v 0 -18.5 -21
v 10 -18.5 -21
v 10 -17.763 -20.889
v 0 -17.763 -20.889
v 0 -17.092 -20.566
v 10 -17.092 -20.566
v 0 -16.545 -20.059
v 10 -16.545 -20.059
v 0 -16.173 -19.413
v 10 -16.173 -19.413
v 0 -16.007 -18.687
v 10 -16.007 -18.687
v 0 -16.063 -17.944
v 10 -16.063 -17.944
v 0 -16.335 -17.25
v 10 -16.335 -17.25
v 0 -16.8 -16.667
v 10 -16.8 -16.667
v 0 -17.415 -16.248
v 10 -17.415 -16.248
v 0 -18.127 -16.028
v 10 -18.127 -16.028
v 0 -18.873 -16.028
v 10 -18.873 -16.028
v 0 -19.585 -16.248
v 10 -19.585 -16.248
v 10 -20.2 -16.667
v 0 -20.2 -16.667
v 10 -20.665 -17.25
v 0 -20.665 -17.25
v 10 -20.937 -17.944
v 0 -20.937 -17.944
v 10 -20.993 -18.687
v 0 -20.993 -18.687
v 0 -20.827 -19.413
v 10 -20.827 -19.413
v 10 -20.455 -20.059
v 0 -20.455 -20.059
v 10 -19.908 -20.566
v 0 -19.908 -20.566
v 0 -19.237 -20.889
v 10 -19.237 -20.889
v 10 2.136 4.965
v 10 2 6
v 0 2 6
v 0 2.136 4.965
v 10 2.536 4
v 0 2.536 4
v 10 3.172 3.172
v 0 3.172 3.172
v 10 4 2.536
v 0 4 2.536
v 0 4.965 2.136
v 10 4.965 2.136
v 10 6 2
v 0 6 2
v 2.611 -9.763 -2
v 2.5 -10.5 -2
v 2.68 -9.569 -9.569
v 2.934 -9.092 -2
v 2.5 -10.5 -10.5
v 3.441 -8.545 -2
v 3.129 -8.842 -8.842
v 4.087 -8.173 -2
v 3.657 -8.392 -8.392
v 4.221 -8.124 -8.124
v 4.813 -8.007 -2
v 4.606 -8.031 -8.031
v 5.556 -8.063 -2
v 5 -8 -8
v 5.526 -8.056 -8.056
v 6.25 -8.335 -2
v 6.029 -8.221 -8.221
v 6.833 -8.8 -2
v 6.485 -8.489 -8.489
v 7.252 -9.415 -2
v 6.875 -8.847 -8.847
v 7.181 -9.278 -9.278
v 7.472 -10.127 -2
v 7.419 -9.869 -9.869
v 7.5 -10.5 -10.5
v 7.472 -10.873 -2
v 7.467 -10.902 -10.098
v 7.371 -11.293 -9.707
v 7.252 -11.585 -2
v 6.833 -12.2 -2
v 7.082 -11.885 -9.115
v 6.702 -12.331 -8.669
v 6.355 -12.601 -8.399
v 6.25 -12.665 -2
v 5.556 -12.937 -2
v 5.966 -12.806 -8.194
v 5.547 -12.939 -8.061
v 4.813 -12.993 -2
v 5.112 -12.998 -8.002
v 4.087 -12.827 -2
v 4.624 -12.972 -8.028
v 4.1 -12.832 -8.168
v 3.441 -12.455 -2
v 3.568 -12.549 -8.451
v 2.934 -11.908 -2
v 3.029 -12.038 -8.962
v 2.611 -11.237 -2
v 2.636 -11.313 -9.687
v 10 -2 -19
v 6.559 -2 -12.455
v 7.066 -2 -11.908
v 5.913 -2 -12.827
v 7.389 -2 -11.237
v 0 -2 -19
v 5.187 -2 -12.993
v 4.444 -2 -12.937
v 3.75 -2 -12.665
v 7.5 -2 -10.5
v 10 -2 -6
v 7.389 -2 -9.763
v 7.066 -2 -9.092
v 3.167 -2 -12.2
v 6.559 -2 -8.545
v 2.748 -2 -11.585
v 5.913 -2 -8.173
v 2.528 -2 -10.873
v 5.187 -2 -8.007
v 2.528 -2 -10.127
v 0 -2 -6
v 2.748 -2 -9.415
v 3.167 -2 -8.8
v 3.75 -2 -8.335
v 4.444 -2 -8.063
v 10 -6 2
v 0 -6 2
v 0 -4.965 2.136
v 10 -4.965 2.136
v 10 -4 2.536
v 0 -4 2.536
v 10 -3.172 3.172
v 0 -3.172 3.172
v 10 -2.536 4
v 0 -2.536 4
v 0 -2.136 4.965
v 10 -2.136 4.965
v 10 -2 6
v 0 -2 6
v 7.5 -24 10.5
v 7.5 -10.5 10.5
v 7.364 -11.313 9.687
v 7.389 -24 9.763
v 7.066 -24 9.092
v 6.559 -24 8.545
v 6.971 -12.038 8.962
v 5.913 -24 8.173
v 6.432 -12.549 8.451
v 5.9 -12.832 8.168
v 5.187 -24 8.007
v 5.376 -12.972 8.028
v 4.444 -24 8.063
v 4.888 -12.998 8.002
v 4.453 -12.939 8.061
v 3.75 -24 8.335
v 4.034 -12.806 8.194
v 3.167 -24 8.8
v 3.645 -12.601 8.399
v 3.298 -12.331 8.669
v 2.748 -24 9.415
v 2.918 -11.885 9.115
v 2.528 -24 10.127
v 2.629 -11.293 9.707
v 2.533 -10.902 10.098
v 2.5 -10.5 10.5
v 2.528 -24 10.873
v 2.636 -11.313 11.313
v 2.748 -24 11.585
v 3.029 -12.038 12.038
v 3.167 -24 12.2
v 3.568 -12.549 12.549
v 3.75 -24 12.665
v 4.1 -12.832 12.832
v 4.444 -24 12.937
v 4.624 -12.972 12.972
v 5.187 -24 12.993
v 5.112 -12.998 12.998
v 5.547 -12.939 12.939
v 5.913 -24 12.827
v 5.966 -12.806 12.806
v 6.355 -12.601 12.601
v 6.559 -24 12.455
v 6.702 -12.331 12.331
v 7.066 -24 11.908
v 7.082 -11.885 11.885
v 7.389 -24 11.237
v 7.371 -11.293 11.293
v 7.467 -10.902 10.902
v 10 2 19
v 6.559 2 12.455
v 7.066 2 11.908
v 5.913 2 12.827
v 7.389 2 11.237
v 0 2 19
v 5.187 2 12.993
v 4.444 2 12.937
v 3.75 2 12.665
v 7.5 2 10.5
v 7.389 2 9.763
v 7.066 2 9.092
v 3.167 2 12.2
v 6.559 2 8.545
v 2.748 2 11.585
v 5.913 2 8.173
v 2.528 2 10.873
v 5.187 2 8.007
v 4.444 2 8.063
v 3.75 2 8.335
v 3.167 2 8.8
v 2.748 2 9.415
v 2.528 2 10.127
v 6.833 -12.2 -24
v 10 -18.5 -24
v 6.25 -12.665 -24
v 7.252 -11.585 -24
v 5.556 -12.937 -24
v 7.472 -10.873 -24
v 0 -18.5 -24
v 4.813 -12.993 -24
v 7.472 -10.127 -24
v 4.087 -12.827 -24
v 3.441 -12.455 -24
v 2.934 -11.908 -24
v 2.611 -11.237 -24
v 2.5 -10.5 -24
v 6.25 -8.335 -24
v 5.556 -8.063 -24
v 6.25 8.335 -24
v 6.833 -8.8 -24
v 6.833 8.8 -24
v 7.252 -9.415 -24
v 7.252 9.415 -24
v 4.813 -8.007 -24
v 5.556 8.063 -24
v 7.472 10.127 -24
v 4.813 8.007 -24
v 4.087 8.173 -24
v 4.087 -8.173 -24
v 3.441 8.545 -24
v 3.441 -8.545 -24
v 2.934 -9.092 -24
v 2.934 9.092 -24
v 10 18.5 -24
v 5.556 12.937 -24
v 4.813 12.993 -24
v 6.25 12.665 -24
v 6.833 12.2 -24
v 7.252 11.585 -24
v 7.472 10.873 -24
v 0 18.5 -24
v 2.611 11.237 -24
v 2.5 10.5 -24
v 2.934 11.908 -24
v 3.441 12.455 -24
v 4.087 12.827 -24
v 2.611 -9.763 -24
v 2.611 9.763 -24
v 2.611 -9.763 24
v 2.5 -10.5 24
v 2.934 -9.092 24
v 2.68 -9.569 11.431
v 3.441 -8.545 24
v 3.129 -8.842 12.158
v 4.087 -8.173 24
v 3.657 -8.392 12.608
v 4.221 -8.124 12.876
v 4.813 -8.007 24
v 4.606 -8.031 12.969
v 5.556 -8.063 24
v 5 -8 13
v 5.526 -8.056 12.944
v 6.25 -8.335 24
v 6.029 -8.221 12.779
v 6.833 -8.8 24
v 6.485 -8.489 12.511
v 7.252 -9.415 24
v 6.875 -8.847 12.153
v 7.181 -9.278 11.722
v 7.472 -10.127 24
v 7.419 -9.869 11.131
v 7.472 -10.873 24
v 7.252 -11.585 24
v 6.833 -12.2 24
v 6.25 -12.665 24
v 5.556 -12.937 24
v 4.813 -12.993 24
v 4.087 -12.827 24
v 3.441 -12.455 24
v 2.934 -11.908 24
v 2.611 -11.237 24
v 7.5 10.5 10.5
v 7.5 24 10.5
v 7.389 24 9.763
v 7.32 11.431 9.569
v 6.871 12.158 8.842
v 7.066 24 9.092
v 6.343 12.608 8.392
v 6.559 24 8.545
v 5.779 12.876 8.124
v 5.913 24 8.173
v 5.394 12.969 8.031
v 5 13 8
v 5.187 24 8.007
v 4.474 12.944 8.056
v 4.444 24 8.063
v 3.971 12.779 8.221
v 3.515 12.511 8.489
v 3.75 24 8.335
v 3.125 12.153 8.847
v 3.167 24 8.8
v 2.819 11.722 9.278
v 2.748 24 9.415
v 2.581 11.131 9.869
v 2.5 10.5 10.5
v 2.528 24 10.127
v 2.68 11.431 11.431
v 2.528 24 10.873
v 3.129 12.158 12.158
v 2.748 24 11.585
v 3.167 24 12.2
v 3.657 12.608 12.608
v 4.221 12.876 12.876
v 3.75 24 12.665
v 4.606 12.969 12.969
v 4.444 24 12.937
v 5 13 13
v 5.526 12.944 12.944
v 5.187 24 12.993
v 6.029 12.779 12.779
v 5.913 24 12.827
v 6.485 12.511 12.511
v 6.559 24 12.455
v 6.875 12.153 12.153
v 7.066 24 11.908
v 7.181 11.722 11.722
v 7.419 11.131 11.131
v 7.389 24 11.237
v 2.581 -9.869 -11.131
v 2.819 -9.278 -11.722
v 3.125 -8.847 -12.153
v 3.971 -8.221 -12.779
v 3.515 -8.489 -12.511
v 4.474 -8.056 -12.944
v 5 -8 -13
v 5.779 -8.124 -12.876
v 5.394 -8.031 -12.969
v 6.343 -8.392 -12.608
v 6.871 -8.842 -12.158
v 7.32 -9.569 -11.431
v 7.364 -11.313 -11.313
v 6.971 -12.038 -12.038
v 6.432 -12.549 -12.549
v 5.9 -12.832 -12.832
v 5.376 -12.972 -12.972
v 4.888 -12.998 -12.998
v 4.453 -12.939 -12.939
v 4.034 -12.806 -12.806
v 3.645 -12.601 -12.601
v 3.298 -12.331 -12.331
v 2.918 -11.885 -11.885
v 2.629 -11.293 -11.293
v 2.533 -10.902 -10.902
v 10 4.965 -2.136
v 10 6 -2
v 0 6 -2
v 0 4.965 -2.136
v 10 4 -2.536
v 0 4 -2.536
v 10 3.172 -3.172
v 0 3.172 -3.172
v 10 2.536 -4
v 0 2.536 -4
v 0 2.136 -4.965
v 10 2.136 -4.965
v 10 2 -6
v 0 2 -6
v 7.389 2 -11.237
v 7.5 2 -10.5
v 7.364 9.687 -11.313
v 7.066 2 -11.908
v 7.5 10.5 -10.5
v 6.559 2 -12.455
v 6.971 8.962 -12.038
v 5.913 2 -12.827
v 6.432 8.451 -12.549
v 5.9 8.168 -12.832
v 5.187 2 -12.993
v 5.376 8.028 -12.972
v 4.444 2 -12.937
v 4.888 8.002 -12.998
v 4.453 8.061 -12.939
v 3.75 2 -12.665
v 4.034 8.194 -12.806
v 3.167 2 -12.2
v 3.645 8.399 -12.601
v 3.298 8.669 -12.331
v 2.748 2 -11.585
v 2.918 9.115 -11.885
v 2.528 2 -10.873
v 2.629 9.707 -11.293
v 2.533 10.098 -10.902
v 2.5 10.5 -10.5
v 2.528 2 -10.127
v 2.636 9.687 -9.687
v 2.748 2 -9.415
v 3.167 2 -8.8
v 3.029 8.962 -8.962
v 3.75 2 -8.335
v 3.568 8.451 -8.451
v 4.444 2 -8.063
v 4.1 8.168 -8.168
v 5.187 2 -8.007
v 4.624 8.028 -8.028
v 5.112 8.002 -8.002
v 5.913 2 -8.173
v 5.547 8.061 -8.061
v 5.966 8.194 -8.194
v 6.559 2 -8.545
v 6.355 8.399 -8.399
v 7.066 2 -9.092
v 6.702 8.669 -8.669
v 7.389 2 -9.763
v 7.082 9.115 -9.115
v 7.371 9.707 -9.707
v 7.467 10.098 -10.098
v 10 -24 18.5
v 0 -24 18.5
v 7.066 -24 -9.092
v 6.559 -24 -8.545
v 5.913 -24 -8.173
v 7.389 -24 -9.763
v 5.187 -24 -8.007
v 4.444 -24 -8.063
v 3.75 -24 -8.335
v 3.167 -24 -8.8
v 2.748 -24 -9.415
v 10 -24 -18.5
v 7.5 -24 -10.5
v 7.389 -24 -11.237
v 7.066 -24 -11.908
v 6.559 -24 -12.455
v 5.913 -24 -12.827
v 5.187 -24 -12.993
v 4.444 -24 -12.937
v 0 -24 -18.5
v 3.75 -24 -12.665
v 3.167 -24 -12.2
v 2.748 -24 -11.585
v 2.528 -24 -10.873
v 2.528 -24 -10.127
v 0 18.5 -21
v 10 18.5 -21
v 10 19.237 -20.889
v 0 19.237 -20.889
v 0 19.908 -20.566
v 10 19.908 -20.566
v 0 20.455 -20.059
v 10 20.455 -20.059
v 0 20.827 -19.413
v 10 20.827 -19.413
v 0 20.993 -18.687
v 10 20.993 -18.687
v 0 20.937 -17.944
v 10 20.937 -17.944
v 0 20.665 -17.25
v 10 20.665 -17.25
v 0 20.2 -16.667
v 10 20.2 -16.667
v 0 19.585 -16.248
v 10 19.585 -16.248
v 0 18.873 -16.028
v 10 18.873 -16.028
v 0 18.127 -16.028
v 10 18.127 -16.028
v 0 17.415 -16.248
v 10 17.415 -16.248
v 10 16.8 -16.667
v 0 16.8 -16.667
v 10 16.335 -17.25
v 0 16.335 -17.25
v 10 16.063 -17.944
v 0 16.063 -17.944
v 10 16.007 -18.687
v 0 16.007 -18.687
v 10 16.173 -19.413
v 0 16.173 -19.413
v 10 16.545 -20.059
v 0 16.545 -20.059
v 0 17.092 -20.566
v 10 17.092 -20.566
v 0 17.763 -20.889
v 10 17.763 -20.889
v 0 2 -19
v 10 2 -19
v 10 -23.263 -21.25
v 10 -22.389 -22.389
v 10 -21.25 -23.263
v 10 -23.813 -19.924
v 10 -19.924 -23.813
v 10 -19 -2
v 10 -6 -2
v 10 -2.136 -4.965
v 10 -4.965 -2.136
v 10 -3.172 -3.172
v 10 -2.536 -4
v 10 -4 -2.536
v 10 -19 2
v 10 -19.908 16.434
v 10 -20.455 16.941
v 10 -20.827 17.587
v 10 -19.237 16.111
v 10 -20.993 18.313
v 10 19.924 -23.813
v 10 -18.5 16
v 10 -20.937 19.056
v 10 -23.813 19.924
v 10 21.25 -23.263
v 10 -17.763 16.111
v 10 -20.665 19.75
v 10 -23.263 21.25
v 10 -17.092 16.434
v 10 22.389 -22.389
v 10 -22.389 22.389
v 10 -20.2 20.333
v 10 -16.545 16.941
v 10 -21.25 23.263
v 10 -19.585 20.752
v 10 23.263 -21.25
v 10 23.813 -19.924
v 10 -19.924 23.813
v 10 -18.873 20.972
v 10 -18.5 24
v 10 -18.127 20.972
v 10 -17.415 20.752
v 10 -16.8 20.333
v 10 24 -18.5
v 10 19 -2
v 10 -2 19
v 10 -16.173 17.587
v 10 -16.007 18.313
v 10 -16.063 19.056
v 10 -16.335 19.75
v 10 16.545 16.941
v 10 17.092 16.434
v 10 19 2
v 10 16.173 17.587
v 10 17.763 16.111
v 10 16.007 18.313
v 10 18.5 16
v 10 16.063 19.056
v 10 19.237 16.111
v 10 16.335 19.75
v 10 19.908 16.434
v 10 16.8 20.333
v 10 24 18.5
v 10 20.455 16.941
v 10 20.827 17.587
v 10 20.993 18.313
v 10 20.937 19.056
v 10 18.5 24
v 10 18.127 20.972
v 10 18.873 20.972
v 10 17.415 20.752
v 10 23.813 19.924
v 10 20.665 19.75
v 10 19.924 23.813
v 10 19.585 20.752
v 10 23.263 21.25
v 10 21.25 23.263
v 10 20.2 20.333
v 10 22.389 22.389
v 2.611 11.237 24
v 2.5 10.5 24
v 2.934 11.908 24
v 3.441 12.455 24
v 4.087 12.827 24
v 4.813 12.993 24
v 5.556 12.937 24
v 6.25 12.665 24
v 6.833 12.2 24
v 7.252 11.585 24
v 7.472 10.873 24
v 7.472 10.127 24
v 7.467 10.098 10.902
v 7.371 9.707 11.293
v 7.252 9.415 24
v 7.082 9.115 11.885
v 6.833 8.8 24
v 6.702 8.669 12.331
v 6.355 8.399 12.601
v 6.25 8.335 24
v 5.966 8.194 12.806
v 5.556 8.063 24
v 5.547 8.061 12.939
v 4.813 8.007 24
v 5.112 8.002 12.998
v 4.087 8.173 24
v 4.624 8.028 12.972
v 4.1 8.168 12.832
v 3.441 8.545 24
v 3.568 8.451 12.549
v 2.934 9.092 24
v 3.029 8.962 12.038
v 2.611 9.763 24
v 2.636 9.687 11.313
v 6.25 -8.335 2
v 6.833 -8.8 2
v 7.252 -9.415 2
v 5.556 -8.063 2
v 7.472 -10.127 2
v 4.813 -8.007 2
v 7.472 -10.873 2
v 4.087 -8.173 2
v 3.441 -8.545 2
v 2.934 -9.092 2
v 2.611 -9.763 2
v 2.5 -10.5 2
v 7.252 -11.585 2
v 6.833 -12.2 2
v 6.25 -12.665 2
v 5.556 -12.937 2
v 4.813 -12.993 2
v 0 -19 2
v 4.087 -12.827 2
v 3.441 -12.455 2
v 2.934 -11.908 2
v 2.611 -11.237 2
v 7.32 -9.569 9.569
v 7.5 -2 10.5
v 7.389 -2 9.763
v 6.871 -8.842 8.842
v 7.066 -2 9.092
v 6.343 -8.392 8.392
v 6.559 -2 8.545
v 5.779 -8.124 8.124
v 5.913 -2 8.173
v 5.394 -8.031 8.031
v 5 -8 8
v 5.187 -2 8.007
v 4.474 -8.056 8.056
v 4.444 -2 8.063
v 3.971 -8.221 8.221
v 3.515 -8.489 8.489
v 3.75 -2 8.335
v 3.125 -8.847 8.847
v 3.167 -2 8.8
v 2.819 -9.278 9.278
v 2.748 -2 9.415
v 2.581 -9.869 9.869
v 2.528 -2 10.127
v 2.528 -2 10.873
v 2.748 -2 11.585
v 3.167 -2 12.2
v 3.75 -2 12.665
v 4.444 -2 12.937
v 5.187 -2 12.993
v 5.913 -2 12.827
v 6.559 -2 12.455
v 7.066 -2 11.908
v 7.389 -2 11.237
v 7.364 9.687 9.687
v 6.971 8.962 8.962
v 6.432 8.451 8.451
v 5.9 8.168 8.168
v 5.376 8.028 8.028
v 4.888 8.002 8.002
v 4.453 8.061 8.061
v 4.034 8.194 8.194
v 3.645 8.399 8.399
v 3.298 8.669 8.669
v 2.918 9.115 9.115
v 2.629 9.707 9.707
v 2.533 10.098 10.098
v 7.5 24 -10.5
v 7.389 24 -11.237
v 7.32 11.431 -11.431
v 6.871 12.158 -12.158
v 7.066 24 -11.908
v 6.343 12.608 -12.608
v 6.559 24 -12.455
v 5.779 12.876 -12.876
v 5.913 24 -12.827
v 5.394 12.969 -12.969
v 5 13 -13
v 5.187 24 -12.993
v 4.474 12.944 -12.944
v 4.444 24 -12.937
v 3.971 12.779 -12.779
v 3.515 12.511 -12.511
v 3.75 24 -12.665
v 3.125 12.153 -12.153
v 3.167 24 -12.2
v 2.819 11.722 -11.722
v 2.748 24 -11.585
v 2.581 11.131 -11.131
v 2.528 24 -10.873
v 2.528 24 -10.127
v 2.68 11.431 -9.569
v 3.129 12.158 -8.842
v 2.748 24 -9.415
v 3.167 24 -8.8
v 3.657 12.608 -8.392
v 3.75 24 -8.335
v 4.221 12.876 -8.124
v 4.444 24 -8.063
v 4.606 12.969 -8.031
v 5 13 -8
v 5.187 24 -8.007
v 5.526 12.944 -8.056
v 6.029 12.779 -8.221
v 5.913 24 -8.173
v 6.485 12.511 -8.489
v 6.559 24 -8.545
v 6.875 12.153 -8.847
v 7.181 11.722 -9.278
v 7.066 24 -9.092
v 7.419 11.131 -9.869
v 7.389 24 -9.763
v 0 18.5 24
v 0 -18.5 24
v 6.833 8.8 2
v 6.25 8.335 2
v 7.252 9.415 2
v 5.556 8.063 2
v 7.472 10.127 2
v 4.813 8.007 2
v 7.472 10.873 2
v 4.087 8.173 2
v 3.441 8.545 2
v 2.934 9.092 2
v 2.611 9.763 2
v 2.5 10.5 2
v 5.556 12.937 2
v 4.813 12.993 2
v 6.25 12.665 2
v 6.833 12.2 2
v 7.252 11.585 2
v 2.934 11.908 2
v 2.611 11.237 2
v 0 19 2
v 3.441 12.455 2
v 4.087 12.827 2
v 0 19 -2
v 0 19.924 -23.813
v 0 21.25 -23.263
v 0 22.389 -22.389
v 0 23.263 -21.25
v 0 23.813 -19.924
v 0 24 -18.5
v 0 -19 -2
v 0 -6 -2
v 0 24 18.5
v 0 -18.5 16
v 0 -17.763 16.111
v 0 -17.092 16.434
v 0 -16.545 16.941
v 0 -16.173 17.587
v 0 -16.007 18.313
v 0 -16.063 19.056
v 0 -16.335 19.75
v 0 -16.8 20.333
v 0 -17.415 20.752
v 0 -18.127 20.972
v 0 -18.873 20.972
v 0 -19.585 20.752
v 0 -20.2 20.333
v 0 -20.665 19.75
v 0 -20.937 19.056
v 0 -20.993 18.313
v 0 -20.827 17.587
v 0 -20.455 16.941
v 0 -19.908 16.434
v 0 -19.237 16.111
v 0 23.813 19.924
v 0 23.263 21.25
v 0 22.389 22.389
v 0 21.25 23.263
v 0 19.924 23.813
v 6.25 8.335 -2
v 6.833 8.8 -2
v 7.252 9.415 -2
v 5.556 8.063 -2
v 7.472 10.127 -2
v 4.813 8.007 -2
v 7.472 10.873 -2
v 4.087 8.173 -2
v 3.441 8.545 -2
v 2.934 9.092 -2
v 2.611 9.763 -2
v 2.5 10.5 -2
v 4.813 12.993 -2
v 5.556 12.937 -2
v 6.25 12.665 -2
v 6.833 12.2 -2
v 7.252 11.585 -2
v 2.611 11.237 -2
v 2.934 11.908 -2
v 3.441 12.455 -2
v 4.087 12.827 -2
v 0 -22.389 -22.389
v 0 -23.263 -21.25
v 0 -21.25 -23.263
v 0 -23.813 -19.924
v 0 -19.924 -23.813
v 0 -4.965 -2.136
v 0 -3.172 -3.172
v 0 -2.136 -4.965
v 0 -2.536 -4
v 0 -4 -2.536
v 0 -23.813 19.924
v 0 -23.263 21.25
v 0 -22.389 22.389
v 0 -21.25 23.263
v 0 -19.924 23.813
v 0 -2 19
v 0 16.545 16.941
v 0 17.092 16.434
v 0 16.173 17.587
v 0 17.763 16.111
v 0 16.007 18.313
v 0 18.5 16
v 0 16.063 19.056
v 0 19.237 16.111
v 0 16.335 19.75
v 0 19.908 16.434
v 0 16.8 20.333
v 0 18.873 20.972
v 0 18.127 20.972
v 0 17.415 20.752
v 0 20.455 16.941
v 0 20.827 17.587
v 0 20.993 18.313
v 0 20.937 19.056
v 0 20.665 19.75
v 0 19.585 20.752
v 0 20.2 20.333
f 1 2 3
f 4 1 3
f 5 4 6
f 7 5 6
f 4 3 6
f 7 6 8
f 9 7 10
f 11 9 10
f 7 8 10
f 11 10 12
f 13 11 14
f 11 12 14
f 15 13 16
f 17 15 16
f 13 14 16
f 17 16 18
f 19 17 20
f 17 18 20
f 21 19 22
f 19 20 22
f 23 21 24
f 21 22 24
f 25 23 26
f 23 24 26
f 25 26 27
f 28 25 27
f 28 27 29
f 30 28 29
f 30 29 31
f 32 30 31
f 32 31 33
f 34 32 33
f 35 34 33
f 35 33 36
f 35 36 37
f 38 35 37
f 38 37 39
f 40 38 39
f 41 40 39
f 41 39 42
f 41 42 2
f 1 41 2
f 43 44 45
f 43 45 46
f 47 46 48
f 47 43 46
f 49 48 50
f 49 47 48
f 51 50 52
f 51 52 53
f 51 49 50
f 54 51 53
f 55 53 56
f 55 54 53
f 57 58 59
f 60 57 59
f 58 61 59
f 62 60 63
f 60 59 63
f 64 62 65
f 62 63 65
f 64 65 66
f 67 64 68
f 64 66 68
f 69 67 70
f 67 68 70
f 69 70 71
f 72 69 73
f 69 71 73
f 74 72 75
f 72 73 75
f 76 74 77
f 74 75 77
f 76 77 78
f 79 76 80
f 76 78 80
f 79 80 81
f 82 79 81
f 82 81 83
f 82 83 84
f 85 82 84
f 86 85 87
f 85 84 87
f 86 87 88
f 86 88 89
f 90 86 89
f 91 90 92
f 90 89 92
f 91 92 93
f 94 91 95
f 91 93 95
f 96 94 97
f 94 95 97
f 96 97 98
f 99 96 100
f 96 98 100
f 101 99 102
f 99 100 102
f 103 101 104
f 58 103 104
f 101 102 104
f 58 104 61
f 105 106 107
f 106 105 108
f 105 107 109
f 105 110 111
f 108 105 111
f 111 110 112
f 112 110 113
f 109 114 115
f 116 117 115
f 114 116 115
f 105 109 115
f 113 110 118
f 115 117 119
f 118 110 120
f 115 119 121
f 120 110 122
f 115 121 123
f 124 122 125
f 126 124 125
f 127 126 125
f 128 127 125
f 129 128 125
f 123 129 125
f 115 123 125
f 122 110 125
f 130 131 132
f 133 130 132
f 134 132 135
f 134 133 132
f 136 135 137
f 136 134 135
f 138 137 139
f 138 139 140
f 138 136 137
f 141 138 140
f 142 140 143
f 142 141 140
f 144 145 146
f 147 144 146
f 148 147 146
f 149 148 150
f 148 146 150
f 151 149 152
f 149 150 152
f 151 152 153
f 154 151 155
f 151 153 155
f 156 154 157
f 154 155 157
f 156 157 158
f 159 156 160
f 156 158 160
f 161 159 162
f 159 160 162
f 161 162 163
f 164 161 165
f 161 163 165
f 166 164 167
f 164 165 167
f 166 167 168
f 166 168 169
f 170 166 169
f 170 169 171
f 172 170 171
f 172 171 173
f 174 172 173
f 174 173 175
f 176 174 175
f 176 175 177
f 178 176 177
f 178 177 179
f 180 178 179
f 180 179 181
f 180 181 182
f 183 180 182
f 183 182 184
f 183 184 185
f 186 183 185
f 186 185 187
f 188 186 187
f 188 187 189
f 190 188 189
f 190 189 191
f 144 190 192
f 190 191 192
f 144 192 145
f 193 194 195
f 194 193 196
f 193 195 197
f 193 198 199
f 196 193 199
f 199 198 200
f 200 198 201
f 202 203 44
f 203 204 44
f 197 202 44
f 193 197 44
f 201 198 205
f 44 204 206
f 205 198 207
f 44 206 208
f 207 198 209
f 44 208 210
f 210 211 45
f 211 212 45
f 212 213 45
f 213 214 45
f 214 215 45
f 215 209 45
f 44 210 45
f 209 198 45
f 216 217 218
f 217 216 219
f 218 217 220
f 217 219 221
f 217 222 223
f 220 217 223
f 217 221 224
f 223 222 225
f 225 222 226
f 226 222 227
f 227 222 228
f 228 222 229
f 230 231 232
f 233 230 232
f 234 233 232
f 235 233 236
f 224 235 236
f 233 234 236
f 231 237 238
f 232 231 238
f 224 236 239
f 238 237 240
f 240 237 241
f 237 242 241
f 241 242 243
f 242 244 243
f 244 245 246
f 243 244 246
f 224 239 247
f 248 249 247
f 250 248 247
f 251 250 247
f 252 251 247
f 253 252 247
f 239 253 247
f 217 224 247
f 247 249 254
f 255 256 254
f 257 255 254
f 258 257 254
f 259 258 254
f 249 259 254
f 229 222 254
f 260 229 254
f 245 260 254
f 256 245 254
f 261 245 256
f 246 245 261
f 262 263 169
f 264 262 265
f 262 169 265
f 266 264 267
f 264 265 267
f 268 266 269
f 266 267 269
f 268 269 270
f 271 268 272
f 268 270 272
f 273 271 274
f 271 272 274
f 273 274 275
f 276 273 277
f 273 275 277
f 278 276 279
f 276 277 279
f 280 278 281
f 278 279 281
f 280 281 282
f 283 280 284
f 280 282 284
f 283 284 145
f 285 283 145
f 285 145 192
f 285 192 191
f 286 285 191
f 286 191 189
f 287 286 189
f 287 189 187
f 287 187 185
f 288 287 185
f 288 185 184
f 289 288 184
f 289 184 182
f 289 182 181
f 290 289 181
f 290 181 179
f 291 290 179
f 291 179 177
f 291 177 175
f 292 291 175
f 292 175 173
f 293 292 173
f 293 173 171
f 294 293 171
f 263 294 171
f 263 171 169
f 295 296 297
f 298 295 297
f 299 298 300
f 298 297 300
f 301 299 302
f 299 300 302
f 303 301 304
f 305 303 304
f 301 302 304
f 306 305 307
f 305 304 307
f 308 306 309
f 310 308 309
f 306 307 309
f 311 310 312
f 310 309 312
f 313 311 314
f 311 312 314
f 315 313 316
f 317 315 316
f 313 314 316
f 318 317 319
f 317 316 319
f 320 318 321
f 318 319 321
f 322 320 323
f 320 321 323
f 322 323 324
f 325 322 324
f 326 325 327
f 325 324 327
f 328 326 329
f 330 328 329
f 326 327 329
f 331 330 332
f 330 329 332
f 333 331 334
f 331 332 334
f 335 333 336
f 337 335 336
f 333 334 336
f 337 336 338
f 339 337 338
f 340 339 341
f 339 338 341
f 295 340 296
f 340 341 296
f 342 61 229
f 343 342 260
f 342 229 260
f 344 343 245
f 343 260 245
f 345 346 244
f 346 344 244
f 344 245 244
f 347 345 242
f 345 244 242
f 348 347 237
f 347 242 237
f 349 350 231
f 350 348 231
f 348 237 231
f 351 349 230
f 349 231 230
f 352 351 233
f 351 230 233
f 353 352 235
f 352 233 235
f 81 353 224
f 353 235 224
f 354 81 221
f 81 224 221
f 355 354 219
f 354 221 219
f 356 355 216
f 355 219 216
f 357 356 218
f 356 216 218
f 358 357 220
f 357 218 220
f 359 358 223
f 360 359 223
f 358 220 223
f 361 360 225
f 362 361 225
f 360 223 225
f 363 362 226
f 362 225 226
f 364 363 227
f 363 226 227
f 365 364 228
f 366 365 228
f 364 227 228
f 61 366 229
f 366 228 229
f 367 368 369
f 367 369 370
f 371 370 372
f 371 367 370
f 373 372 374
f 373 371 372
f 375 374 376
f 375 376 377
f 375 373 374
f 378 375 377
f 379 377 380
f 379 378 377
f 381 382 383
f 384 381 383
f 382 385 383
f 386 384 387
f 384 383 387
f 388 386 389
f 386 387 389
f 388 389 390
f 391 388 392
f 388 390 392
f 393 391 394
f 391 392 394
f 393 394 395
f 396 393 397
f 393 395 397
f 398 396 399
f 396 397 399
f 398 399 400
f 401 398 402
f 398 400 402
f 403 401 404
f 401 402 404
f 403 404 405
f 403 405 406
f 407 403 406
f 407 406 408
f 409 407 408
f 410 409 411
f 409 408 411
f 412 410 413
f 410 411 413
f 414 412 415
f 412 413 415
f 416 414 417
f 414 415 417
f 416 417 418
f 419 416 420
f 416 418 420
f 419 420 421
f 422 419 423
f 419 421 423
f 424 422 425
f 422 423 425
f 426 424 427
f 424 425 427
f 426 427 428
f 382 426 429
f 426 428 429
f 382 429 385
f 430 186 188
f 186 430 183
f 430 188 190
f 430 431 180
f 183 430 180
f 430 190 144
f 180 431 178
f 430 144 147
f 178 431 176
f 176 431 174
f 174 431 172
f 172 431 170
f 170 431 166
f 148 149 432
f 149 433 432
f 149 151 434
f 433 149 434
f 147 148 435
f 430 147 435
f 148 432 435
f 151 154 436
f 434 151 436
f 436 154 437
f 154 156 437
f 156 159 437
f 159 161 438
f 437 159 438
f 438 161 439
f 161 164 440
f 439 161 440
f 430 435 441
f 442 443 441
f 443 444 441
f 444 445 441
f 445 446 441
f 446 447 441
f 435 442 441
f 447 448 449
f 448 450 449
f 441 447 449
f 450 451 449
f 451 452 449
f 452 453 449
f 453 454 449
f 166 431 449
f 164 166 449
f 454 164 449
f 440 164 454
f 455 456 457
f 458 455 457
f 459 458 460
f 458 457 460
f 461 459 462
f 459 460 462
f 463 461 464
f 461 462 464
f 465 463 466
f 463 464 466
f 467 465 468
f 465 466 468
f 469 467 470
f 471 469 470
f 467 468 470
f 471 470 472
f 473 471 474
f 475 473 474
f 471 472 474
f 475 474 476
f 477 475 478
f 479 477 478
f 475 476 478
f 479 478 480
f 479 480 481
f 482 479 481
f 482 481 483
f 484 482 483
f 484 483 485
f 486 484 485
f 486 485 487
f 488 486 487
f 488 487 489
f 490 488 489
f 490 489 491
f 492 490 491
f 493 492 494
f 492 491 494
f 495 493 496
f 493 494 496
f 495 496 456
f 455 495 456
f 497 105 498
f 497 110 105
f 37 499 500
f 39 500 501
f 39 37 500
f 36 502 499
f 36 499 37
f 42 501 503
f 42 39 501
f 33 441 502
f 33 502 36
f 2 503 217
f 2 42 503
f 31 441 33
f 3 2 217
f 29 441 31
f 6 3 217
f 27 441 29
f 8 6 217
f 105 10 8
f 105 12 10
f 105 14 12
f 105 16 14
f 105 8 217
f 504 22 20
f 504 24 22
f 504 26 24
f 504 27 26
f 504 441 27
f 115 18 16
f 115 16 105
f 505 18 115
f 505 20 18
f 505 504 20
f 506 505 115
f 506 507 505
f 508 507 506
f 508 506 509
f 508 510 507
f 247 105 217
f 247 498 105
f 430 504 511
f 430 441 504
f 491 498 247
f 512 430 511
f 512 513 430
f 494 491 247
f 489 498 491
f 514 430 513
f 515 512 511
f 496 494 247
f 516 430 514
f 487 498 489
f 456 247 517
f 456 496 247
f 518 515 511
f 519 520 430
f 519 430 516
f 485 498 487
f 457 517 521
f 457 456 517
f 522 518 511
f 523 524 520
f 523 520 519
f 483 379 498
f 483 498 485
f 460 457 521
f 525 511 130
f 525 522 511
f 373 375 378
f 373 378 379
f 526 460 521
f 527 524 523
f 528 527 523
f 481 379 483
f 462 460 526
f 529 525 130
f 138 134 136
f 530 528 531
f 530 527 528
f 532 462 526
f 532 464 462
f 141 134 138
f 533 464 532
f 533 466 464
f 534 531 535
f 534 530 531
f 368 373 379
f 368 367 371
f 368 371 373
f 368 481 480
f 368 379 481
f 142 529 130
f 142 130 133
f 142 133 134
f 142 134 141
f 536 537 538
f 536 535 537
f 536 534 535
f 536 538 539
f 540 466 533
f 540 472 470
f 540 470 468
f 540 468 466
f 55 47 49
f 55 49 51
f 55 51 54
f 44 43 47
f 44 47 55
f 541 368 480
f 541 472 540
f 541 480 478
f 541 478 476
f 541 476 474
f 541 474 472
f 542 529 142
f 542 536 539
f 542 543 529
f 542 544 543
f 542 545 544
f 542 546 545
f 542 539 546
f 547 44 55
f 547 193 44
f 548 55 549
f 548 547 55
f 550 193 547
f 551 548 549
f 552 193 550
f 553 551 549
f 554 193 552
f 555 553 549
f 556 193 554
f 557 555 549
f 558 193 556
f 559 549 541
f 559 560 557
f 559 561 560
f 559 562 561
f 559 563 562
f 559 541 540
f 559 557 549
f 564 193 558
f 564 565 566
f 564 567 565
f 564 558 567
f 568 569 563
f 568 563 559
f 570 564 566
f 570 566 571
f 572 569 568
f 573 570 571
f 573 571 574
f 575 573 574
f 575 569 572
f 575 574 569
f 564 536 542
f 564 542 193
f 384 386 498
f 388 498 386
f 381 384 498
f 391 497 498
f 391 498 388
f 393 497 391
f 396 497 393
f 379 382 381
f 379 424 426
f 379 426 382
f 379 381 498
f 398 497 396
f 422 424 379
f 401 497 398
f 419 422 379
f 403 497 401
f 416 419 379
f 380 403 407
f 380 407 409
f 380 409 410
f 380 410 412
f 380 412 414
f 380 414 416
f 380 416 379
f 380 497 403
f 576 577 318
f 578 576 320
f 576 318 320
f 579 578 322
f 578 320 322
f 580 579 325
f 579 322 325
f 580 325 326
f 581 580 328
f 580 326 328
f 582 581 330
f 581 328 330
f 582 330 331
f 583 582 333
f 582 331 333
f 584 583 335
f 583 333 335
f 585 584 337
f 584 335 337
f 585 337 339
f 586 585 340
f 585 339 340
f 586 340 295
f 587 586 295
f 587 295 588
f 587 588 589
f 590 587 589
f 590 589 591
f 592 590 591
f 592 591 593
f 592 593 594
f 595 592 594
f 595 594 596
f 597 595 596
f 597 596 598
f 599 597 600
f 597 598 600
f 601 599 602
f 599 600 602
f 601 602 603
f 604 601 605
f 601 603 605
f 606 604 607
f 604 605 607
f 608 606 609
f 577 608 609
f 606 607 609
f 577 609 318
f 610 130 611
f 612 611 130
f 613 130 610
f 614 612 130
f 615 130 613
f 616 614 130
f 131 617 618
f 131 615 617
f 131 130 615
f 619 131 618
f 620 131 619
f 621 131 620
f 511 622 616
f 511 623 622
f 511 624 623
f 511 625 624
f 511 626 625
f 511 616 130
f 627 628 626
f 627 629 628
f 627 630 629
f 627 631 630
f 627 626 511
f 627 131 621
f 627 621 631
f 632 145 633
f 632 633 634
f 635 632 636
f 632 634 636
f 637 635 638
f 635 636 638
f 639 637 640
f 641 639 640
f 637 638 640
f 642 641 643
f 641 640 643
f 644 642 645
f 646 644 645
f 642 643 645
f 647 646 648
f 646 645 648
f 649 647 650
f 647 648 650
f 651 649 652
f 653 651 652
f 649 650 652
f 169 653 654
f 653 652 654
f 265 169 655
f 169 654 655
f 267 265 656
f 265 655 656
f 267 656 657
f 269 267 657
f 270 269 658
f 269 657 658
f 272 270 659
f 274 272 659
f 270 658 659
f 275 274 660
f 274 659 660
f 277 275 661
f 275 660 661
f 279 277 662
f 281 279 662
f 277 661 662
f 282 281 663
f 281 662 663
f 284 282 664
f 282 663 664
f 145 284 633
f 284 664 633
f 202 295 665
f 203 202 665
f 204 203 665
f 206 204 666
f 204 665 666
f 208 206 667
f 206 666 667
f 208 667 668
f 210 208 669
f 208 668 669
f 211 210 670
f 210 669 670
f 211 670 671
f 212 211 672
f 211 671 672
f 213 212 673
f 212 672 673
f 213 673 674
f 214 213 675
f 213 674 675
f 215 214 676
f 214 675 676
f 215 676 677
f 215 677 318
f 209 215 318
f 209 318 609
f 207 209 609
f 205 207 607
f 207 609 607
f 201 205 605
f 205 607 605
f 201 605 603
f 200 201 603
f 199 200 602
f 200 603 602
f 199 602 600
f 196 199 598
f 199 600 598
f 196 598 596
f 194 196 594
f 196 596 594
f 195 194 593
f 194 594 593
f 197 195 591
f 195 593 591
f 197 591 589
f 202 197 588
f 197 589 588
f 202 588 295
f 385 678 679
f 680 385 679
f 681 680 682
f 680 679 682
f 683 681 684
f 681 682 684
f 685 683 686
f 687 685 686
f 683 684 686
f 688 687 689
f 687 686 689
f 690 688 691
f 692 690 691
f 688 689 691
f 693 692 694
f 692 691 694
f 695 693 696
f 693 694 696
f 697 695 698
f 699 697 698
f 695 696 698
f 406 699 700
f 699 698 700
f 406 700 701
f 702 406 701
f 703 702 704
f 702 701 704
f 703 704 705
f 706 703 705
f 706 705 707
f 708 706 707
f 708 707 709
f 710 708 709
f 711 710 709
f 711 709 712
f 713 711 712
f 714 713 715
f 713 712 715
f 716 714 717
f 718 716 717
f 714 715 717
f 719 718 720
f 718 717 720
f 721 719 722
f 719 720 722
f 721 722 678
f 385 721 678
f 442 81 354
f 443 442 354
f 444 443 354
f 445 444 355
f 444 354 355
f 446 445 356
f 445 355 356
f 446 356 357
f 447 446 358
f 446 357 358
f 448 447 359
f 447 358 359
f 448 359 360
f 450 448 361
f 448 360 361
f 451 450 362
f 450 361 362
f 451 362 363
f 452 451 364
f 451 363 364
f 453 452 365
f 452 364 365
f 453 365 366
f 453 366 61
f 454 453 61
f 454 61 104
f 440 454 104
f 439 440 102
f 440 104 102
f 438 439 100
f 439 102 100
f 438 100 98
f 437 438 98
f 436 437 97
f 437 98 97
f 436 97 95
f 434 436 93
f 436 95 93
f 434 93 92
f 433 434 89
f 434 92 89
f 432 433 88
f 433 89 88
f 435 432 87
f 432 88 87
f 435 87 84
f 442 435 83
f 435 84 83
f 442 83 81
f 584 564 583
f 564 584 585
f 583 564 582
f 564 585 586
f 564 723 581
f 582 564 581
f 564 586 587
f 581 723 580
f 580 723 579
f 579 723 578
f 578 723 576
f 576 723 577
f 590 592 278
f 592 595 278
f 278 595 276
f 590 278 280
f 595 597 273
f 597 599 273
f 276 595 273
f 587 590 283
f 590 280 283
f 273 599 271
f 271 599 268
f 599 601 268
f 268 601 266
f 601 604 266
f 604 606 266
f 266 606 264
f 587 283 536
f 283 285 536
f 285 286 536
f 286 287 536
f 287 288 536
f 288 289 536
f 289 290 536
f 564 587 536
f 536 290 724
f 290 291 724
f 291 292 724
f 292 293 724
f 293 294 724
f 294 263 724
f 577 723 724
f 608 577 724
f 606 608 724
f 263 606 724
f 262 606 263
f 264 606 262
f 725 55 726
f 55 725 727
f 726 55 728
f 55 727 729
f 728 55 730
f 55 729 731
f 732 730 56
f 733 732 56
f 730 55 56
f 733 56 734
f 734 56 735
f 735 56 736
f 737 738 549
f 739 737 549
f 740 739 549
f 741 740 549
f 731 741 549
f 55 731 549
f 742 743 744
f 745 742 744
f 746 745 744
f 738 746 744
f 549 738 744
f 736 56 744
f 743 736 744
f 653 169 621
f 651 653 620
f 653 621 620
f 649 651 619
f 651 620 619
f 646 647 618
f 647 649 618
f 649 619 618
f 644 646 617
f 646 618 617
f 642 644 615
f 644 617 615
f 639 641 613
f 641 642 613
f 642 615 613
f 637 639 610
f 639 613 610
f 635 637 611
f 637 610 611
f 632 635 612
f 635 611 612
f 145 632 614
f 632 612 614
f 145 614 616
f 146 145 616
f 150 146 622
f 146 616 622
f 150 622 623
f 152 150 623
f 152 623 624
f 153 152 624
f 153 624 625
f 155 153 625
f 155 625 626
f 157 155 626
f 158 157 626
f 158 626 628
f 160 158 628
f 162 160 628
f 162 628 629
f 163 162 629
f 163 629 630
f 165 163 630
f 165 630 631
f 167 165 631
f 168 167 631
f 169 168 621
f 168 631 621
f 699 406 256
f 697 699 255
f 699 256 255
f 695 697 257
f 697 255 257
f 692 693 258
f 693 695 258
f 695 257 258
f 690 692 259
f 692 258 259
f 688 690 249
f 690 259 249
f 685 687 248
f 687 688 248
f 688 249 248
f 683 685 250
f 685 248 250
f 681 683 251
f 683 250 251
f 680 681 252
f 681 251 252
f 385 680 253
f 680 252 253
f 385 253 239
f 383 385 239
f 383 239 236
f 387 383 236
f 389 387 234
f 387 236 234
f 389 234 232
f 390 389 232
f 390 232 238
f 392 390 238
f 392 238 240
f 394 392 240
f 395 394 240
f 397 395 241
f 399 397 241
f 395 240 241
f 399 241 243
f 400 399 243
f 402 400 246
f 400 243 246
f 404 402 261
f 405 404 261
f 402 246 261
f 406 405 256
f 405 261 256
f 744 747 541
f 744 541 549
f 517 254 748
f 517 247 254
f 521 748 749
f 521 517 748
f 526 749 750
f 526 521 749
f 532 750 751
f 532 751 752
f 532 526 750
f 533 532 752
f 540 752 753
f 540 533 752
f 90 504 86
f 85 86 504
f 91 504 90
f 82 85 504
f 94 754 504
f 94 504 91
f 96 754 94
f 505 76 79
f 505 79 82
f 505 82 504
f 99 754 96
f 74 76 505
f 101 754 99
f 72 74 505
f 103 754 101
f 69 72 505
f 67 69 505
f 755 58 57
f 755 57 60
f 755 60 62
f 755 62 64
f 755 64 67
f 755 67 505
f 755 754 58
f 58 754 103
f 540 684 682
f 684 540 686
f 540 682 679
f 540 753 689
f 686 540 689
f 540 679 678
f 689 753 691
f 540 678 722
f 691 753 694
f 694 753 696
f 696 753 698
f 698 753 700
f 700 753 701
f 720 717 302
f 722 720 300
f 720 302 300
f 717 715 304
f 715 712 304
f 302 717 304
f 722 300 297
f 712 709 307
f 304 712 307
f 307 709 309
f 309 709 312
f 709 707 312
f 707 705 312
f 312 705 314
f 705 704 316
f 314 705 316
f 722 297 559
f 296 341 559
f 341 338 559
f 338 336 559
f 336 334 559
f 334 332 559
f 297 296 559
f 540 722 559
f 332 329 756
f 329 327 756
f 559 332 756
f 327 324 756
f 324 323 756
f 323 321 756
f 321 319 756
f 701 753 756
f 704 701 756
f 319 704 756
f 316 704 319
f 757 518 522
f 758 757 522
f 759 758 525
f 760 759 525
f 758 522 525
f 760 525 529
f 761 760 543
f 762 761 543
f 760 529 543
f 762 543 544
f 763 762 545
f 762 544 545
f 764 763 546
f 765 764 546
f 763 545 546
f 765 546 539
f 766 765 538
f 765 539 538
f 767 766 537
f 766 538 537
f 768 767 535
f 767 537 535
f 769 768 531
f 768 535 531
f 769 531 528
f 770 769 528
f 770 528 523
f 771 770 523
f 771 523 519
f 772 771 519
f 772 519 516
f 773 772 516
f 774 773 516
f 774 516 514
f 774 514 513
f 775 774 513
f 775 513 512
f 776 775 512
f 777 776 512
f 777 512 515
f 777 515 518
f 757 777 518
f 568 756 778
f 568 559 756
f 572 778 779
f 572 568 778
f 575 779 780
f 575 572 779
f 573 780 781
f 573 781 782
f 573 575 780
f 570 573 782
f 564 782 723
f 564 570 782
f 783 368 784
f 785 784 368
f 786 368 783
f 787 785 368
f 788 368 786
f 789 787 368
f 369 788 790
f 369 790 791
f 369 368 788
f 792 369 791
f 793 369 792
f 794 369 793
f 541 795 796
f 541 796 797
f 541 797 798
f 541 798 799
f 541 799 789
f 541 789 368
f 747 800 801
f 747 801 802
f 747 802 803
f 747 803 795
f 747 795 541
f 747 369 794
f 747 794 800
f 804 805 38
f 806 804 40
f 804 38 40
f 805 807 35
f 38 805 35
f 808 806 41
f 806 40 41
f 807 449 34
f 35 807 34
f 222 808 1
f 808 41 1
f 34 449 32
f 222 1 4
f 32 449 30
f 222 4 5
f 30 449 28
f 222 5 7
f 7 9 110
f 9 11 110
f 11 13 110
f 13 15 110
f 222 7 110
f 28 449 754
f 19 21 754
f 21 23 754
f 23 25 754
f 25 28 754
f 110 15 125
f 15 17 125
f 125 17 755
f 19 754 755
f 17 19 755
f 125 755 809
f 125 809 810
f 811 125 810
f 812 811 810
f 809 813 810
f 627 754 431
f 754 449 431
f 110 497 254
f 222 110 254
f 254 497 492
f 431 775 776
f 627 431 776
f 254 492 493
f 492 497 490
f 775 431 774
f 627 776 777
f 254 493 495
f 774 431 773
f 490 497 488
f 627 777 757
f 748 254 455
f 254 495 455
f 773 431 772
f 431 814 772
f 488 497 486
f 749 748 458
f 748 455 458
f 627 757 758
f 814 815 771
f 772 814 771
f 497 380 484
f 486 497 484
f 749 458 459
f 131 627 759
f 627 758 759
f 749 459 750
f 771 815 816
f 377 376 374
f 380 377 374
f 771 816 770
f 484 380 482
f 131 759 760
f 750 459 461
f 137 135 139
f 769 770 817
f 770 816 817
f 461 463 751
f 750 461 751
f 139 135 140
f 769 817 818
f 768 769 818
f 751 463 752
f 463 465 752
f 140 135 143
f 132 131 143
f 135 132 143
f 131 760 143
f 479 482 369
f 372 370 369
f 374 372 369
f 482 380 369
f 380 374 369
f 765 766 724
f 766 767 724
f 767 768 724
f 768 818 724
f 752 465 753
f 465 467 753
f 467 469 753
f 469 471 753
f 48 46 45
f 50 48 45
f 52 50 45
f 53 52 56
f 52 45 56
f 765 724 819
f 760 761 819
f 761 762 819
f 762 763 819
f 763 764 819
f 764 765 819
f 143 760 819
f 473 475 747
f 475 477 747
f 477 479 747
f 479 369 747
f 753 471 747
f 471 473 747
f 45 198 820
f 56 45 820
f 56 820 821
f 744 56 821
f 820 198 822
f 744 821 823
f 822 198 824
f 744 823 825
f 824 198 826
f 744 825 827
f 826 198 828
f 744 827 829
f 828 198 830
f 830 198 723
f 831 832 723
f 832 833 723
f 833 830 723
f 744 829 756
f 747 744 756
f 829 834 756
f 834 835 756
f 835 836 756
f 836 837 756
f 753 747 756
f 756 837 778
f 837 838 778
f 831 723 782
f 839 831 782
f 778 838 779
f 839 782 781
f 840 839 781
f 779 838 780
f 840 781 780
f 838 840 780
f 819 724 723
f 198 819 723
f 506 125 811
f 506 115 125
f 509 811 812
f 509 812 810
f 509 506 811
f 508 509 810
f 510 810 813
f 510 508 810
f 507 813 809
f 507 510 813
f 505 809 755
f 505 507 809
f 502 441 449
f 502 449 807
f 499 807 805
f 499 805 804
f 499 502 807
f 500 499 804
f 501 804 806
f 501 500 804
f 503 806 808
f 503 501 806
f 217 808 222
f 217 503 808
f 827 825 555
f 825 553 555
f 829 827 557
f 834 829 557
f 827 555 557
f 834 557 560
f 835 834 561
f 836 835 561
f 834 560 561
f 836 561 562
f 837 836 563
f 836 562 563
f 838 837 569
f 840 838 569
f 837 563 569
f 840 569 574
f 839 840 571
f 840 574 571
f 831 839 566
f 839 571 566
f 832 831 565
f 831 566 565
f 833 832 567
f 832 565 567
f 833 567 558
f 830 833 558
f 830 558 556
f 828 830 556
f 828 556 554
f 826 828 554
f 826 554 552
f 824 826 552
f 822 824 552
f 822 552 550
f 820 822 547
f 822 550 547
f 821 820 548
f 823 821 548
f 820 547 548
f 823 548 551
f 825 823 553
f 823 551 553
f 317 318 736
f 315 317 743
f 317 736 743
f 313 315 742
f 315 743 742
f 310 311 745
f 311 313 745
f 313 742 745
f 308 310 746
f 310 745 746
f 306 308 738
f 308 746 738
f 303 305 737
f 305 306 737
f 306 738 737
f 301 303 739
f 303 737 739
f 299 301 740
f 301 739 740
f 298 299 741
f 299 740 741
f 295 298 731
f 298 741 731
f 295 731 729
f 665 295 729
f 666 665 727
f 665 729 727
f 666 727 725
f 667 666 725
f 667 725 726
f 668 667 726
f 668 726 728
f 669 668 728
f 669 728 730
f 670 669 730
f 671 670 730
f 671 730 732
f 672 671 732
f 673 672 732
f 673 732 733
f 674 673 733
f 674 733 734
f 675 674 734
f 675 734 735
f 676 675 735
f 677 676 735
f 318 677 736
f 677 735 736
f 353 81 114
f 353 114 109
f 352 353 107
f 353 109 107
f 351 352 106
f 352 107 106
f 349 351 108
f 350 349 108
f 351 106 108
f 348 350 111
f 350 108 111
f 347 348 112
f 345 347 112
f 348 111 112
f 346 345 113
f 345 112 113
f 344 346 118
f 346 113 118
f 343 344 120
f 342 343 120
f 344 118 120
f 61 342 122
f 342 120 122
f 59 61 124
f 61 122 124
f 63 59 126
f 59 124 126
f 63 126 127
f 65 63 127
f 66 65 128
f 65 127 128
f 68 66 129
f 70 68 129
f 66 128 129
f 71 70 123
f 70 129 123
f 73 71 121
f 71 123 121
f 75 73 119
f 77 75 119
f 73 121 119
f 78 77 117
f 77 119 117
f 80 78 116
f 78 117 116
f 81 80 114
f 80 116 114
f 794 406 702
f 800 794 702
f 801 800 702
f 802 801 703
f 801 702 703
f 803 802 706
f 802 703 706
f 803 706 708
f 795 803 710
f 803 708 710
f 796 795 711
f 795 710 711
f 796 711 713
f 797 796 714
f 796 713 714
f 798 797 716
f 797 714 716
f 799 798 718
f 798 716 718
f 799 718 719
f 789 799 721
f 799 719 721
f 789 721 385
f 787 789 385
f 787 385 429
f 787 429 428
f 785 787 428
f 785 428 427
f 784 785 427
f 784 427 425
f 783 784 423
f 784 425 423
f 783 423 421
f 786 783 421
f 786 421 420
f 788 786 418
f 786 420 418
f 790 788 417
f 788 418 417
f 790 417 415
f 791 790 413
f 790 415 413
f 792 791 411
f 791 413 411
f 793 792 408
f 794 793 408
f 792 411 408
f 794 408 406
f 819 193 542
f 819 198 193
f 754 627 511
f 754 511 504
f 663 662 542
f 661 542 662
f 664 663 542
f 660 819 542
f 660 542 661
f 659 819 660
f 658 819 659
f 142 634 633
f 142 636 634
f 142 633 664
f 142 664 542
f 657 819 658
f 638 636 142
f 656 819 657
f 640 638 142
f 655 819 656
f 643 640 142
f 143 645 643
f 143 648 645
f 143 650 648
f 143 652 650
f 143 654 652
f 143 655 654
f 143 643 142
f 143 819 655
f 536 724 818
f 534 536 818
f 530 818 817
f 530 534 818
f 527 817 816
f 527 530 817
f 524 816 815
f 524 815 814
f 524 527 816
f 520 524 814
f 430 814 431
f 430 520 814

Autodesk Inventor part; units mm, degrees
ref_plane "YZ Plane" through (0, 0, 0) normal (1, 0, 0) x (0, 1, 0)
ref_plane "XZ Plane" through (0, 0, 0) normal (0, 1, 0) x (-1, 0, 0)
ref_plane "XY Plane" through (0, 0, 0) normal (0, 0, 1) x (1, 0, 0)
sketch "Sketch1" plane through (0, 0, 0) normal (1, 0, 0) x (0, 1, 0)
  circle A0 centre (0, 0) radius 2.8284
  line L0 (0, 0) -> (-2.8284, 0)
  line L1 (-2.8284, 0) -> (-2.8284, -2.8284)
  line L2 (-2.8284, -2.8284) -> (0, -2.8284)
  line L3 (0, -2.8284) -> (0, 0)
  line L4 (0, 0) -> (-2.8284, -2.8284)
  line L5 (2, 2) -> (-2, 2)
  line L6 (-2, 2) -> (-2, -2)
  line L7 (-2, -2) -> (2, -2)
  line L8 (2, -2) -> (2, 2)
  line L9 (2, 2) -> (-2, -2) construction
  line L10 (-2, 2) -> (2, -2) construction
  line L11 (2, 2) -> (-2, 2)
  line L12 (-2, 2) -> (-2, 4)
  line L13 (-2, 4) -> (2, 4)
  line L14 (2, 4) -> (2, 2)
  line L15 (0, 4) -> (0, 19)
  line L16 (-2, 2) -> (-4, 2)
  line L17 (-4, 2) -> (-4, -2)
  line L18 (-4, -2) -> (-2, -2)
  line L19 (-4, 0) -> (-19, 0)
  line L20 (19, -19) -> (19, 19)
  line L21 (19, 19) -> (-19, 19)
  line L22 (-19, 19) -> (-19, -19)
  line L23 (-19, -19) -> (19, -19)
  line L24 (19, -19) -> (-19, 19) construction
  line L25 (19, 19) -> (-19, -19) construction
  line L26 (0, 19) -> (0, 24)
  line L27 (-19, 0) -> (-24, 0)
  line L28 (24, -24) -> (24, 24)
  line L29 (24, 24) -> (-24, 24)
  line L30 (-24, 24) -> (-24, -24)
  line L31 (-24, -24) -> (24, -24)
  line L32 (24, -24) -> (-24, 24) construction
  line L33 (24, 24) -> (-24, -24) construction
  line L34 (-2, 2) -> (-19, 2)
  line L35 (-19, -2) -> (-2, -2)
  line L36 (-2, -2) -> (-2, 2)
  line L37 (-2, -2) -> (-19, -2)
  line L38 (-19, -2) -> (-19, -19)
  line L39 (-19, -19) -> (-2, -19)
  line L40 (-2, -19) -> (-2, -2)
  line L41 (2, -2) -> (19, -2)
  line L42 (19, -2) -> (19, -19)
  line L43 (19, -19) -> (2, -19)
  line L44 (2, -19) -> (2, -2)
  line L45 (2, 2) -> (19, 2)
  line L46 (19, 2) -> (19, 19)
  line L47 (19, 19) -> (2, 19)
  line L48 (2, 19) -> (2, 2)
  line L49 (-2, 2) -> (-19, 2)
  line L50 (-19, 2) -> (-19, 19)
  line L51 (-19, 19) -> (-2, 19)
  line L52 (-2, 19) -> (-2, 2)
  point P0 (-2, 19)
  point P1 (2, 4)
  point P2 (2, -19)
  point P3 (-2, -19)
  dimension "d0" = 4
  dimension "d1" = 2
  dimension "d5" = 15
  dimension "d6" = 2
  dimension "d7" = 15
  dimension "d8" = 2
  dimension "d9" = 0
  dimension "d10" = 5
  dimension "d11" = 5
  dimension "d12" = 15
  dimension "d13" = 22.6716
  dimension "d14" = 20
  dimension "d15" = 29.7321
extrude "Extrusion1" add sketch "Sketch1" along normal blind 10 contours L14 L48 L21 L20 L45 | L41 L20 L23 L44 | L16 L34 L22 L21 L52 L12 | L20 L21 L26 L29 L28 L31 L30 L27 L22 L23 | L40 L2 L4 | L4 L1 L18 | L40 L23 L22 L35 L18 L1 L2 | L21 L22 L27 L30 L29 L26
sketch "Sketch2" plane through (0, 24, 24) normal (0, 1, 0) x (1, 0, 0)
  line L0 (10, 0) -> (0, 0) projected
  line L1 (0, 0) -> (0, 48) projected
  line L2 (0, 48) -> (10, 48) projected
  line L3 (10, 48) -> (10, 0) projected
  line L4 (0, 48) -> (10, 48) projected
  line L5 (0, 48) -> (0, 34.5)
  line L6 (0, 34.5) -> (5, 34.5)
  circle A0 centre (5, 34.5) radius 2.5
  line L7 (0, 0) -> (0, 13.5)
  line L8 (0, 22) -> (0, 5) projected
  line L9 (0, 13.5) -> (5, 13.5)
  circle A1 centre (5, 13.5) radius 2.5
  point P0 (0, 24)
  dimension "d18" = 13.5
  dimension "d19" = 5
  dimension "d20" = 5
  dimension "d21" = 13.5
  dimension "d22" = 5
  dimension "d23" = 5
extrude "Extrusion2" cut sketch "Sketch2" against normal through all contours A0 | A1
sketch "Sketch3" plane through (0, -24, -24) normal (0, 0, -1) x (-1, 0, 0)
  line L0 (0, 0) -> (-10, 0) projected
  line L1 (0, 0) -> (0, 13.5)
  line L2 (0, 22) -> (0, 5) projected
  line L3 (0, 48) -> (-10, 48) projected
  line L4 (0, 48) -> (0, 34.5)
  line L5 (0, 0) -> (0, 48) projected
  line L6 (0, 34.5) -> (-5, 34.5)
  line L7 (0, 13.5) -> (-5, 13.5)
  circle A0 centre (-5, 13.5) radius 2.5
  circle A1 centre (-5, 34.5) radius 2.5
  point P0 (0, 24)
  dimension "d26" = 13.5
  dimension "d27" = 13.5
  dimension "d28" = 5
  dimension "d29" = 5
  dimension "d30" = 5
  dimension "d31" = 5
extrude "Extrusion3" cut sketch "Sketch3" against normal through all
fillet "Fillet1" radius 4 4 edges at (5, -2, 2) (5, 2, 2) (5, 2, -2) (5, -2, -2)
sketch "Sketch4" plane through (10, 0, 0) normal (1, 0, 0) x (0, 0, -1)
  line L0 (24, 24) -> (-24, 24) projected
  line L1 (24, 24) -> (18.5, 24)
  line L2 (18.5, 24) -> (18.5, 18.5)
  line L3 (18.5, 18.5) -> (24, 18.5)
  line L4 (24, 18.5) -> (24, 24)
  circle A0 centre (18.5, 18.5) radius 2.5
  circle A1 centre (18.5, 18.5) radius 5.5
  circle A2 centre (-18.5, 18.5) radius 5.5
  circle A3 centre (-18.5, 18.5) radius 2.5
  line L5 (-18.5, 24) -> (-24, 24)
  line L6 (-24, 24) -> (-24, 18.5)
  circle A4 centre (-18.5, -18.5) radius 5.5
  circle A5 centre (-18.5, -18.5) radius 2.5
  line L7 (-24, -18.5) -> (-24, -24)
  line L8 (-24, -24) -> (-18.5, -24)
  circle A6 centre (18.5, -18.5) radius 5.5
  circle A7 centre (18.5, -18.5) radius 2.5
  line L9 (18.5, -24) -> (24, -24)
  line L10 (24, -24) -> (24, -18.5)
  point P0 (0, 0)
  point P1 (-18.5, 24)
  dimension "d35" = 5.5
  dimension "d36" = 5.5
  dimension "d37" = 5
  dimension "d40" = 360
extrude "Extrusion4" cut sketch "Sketch4" against normal through all contours L4 A1 L0 | A2 L6 L0 | A0 L3 L2 | L2 L3 A0 | A3 | A4 L8 L7 | A5 | L10 L9 A6 | A7
properties part number "guidance_block"
